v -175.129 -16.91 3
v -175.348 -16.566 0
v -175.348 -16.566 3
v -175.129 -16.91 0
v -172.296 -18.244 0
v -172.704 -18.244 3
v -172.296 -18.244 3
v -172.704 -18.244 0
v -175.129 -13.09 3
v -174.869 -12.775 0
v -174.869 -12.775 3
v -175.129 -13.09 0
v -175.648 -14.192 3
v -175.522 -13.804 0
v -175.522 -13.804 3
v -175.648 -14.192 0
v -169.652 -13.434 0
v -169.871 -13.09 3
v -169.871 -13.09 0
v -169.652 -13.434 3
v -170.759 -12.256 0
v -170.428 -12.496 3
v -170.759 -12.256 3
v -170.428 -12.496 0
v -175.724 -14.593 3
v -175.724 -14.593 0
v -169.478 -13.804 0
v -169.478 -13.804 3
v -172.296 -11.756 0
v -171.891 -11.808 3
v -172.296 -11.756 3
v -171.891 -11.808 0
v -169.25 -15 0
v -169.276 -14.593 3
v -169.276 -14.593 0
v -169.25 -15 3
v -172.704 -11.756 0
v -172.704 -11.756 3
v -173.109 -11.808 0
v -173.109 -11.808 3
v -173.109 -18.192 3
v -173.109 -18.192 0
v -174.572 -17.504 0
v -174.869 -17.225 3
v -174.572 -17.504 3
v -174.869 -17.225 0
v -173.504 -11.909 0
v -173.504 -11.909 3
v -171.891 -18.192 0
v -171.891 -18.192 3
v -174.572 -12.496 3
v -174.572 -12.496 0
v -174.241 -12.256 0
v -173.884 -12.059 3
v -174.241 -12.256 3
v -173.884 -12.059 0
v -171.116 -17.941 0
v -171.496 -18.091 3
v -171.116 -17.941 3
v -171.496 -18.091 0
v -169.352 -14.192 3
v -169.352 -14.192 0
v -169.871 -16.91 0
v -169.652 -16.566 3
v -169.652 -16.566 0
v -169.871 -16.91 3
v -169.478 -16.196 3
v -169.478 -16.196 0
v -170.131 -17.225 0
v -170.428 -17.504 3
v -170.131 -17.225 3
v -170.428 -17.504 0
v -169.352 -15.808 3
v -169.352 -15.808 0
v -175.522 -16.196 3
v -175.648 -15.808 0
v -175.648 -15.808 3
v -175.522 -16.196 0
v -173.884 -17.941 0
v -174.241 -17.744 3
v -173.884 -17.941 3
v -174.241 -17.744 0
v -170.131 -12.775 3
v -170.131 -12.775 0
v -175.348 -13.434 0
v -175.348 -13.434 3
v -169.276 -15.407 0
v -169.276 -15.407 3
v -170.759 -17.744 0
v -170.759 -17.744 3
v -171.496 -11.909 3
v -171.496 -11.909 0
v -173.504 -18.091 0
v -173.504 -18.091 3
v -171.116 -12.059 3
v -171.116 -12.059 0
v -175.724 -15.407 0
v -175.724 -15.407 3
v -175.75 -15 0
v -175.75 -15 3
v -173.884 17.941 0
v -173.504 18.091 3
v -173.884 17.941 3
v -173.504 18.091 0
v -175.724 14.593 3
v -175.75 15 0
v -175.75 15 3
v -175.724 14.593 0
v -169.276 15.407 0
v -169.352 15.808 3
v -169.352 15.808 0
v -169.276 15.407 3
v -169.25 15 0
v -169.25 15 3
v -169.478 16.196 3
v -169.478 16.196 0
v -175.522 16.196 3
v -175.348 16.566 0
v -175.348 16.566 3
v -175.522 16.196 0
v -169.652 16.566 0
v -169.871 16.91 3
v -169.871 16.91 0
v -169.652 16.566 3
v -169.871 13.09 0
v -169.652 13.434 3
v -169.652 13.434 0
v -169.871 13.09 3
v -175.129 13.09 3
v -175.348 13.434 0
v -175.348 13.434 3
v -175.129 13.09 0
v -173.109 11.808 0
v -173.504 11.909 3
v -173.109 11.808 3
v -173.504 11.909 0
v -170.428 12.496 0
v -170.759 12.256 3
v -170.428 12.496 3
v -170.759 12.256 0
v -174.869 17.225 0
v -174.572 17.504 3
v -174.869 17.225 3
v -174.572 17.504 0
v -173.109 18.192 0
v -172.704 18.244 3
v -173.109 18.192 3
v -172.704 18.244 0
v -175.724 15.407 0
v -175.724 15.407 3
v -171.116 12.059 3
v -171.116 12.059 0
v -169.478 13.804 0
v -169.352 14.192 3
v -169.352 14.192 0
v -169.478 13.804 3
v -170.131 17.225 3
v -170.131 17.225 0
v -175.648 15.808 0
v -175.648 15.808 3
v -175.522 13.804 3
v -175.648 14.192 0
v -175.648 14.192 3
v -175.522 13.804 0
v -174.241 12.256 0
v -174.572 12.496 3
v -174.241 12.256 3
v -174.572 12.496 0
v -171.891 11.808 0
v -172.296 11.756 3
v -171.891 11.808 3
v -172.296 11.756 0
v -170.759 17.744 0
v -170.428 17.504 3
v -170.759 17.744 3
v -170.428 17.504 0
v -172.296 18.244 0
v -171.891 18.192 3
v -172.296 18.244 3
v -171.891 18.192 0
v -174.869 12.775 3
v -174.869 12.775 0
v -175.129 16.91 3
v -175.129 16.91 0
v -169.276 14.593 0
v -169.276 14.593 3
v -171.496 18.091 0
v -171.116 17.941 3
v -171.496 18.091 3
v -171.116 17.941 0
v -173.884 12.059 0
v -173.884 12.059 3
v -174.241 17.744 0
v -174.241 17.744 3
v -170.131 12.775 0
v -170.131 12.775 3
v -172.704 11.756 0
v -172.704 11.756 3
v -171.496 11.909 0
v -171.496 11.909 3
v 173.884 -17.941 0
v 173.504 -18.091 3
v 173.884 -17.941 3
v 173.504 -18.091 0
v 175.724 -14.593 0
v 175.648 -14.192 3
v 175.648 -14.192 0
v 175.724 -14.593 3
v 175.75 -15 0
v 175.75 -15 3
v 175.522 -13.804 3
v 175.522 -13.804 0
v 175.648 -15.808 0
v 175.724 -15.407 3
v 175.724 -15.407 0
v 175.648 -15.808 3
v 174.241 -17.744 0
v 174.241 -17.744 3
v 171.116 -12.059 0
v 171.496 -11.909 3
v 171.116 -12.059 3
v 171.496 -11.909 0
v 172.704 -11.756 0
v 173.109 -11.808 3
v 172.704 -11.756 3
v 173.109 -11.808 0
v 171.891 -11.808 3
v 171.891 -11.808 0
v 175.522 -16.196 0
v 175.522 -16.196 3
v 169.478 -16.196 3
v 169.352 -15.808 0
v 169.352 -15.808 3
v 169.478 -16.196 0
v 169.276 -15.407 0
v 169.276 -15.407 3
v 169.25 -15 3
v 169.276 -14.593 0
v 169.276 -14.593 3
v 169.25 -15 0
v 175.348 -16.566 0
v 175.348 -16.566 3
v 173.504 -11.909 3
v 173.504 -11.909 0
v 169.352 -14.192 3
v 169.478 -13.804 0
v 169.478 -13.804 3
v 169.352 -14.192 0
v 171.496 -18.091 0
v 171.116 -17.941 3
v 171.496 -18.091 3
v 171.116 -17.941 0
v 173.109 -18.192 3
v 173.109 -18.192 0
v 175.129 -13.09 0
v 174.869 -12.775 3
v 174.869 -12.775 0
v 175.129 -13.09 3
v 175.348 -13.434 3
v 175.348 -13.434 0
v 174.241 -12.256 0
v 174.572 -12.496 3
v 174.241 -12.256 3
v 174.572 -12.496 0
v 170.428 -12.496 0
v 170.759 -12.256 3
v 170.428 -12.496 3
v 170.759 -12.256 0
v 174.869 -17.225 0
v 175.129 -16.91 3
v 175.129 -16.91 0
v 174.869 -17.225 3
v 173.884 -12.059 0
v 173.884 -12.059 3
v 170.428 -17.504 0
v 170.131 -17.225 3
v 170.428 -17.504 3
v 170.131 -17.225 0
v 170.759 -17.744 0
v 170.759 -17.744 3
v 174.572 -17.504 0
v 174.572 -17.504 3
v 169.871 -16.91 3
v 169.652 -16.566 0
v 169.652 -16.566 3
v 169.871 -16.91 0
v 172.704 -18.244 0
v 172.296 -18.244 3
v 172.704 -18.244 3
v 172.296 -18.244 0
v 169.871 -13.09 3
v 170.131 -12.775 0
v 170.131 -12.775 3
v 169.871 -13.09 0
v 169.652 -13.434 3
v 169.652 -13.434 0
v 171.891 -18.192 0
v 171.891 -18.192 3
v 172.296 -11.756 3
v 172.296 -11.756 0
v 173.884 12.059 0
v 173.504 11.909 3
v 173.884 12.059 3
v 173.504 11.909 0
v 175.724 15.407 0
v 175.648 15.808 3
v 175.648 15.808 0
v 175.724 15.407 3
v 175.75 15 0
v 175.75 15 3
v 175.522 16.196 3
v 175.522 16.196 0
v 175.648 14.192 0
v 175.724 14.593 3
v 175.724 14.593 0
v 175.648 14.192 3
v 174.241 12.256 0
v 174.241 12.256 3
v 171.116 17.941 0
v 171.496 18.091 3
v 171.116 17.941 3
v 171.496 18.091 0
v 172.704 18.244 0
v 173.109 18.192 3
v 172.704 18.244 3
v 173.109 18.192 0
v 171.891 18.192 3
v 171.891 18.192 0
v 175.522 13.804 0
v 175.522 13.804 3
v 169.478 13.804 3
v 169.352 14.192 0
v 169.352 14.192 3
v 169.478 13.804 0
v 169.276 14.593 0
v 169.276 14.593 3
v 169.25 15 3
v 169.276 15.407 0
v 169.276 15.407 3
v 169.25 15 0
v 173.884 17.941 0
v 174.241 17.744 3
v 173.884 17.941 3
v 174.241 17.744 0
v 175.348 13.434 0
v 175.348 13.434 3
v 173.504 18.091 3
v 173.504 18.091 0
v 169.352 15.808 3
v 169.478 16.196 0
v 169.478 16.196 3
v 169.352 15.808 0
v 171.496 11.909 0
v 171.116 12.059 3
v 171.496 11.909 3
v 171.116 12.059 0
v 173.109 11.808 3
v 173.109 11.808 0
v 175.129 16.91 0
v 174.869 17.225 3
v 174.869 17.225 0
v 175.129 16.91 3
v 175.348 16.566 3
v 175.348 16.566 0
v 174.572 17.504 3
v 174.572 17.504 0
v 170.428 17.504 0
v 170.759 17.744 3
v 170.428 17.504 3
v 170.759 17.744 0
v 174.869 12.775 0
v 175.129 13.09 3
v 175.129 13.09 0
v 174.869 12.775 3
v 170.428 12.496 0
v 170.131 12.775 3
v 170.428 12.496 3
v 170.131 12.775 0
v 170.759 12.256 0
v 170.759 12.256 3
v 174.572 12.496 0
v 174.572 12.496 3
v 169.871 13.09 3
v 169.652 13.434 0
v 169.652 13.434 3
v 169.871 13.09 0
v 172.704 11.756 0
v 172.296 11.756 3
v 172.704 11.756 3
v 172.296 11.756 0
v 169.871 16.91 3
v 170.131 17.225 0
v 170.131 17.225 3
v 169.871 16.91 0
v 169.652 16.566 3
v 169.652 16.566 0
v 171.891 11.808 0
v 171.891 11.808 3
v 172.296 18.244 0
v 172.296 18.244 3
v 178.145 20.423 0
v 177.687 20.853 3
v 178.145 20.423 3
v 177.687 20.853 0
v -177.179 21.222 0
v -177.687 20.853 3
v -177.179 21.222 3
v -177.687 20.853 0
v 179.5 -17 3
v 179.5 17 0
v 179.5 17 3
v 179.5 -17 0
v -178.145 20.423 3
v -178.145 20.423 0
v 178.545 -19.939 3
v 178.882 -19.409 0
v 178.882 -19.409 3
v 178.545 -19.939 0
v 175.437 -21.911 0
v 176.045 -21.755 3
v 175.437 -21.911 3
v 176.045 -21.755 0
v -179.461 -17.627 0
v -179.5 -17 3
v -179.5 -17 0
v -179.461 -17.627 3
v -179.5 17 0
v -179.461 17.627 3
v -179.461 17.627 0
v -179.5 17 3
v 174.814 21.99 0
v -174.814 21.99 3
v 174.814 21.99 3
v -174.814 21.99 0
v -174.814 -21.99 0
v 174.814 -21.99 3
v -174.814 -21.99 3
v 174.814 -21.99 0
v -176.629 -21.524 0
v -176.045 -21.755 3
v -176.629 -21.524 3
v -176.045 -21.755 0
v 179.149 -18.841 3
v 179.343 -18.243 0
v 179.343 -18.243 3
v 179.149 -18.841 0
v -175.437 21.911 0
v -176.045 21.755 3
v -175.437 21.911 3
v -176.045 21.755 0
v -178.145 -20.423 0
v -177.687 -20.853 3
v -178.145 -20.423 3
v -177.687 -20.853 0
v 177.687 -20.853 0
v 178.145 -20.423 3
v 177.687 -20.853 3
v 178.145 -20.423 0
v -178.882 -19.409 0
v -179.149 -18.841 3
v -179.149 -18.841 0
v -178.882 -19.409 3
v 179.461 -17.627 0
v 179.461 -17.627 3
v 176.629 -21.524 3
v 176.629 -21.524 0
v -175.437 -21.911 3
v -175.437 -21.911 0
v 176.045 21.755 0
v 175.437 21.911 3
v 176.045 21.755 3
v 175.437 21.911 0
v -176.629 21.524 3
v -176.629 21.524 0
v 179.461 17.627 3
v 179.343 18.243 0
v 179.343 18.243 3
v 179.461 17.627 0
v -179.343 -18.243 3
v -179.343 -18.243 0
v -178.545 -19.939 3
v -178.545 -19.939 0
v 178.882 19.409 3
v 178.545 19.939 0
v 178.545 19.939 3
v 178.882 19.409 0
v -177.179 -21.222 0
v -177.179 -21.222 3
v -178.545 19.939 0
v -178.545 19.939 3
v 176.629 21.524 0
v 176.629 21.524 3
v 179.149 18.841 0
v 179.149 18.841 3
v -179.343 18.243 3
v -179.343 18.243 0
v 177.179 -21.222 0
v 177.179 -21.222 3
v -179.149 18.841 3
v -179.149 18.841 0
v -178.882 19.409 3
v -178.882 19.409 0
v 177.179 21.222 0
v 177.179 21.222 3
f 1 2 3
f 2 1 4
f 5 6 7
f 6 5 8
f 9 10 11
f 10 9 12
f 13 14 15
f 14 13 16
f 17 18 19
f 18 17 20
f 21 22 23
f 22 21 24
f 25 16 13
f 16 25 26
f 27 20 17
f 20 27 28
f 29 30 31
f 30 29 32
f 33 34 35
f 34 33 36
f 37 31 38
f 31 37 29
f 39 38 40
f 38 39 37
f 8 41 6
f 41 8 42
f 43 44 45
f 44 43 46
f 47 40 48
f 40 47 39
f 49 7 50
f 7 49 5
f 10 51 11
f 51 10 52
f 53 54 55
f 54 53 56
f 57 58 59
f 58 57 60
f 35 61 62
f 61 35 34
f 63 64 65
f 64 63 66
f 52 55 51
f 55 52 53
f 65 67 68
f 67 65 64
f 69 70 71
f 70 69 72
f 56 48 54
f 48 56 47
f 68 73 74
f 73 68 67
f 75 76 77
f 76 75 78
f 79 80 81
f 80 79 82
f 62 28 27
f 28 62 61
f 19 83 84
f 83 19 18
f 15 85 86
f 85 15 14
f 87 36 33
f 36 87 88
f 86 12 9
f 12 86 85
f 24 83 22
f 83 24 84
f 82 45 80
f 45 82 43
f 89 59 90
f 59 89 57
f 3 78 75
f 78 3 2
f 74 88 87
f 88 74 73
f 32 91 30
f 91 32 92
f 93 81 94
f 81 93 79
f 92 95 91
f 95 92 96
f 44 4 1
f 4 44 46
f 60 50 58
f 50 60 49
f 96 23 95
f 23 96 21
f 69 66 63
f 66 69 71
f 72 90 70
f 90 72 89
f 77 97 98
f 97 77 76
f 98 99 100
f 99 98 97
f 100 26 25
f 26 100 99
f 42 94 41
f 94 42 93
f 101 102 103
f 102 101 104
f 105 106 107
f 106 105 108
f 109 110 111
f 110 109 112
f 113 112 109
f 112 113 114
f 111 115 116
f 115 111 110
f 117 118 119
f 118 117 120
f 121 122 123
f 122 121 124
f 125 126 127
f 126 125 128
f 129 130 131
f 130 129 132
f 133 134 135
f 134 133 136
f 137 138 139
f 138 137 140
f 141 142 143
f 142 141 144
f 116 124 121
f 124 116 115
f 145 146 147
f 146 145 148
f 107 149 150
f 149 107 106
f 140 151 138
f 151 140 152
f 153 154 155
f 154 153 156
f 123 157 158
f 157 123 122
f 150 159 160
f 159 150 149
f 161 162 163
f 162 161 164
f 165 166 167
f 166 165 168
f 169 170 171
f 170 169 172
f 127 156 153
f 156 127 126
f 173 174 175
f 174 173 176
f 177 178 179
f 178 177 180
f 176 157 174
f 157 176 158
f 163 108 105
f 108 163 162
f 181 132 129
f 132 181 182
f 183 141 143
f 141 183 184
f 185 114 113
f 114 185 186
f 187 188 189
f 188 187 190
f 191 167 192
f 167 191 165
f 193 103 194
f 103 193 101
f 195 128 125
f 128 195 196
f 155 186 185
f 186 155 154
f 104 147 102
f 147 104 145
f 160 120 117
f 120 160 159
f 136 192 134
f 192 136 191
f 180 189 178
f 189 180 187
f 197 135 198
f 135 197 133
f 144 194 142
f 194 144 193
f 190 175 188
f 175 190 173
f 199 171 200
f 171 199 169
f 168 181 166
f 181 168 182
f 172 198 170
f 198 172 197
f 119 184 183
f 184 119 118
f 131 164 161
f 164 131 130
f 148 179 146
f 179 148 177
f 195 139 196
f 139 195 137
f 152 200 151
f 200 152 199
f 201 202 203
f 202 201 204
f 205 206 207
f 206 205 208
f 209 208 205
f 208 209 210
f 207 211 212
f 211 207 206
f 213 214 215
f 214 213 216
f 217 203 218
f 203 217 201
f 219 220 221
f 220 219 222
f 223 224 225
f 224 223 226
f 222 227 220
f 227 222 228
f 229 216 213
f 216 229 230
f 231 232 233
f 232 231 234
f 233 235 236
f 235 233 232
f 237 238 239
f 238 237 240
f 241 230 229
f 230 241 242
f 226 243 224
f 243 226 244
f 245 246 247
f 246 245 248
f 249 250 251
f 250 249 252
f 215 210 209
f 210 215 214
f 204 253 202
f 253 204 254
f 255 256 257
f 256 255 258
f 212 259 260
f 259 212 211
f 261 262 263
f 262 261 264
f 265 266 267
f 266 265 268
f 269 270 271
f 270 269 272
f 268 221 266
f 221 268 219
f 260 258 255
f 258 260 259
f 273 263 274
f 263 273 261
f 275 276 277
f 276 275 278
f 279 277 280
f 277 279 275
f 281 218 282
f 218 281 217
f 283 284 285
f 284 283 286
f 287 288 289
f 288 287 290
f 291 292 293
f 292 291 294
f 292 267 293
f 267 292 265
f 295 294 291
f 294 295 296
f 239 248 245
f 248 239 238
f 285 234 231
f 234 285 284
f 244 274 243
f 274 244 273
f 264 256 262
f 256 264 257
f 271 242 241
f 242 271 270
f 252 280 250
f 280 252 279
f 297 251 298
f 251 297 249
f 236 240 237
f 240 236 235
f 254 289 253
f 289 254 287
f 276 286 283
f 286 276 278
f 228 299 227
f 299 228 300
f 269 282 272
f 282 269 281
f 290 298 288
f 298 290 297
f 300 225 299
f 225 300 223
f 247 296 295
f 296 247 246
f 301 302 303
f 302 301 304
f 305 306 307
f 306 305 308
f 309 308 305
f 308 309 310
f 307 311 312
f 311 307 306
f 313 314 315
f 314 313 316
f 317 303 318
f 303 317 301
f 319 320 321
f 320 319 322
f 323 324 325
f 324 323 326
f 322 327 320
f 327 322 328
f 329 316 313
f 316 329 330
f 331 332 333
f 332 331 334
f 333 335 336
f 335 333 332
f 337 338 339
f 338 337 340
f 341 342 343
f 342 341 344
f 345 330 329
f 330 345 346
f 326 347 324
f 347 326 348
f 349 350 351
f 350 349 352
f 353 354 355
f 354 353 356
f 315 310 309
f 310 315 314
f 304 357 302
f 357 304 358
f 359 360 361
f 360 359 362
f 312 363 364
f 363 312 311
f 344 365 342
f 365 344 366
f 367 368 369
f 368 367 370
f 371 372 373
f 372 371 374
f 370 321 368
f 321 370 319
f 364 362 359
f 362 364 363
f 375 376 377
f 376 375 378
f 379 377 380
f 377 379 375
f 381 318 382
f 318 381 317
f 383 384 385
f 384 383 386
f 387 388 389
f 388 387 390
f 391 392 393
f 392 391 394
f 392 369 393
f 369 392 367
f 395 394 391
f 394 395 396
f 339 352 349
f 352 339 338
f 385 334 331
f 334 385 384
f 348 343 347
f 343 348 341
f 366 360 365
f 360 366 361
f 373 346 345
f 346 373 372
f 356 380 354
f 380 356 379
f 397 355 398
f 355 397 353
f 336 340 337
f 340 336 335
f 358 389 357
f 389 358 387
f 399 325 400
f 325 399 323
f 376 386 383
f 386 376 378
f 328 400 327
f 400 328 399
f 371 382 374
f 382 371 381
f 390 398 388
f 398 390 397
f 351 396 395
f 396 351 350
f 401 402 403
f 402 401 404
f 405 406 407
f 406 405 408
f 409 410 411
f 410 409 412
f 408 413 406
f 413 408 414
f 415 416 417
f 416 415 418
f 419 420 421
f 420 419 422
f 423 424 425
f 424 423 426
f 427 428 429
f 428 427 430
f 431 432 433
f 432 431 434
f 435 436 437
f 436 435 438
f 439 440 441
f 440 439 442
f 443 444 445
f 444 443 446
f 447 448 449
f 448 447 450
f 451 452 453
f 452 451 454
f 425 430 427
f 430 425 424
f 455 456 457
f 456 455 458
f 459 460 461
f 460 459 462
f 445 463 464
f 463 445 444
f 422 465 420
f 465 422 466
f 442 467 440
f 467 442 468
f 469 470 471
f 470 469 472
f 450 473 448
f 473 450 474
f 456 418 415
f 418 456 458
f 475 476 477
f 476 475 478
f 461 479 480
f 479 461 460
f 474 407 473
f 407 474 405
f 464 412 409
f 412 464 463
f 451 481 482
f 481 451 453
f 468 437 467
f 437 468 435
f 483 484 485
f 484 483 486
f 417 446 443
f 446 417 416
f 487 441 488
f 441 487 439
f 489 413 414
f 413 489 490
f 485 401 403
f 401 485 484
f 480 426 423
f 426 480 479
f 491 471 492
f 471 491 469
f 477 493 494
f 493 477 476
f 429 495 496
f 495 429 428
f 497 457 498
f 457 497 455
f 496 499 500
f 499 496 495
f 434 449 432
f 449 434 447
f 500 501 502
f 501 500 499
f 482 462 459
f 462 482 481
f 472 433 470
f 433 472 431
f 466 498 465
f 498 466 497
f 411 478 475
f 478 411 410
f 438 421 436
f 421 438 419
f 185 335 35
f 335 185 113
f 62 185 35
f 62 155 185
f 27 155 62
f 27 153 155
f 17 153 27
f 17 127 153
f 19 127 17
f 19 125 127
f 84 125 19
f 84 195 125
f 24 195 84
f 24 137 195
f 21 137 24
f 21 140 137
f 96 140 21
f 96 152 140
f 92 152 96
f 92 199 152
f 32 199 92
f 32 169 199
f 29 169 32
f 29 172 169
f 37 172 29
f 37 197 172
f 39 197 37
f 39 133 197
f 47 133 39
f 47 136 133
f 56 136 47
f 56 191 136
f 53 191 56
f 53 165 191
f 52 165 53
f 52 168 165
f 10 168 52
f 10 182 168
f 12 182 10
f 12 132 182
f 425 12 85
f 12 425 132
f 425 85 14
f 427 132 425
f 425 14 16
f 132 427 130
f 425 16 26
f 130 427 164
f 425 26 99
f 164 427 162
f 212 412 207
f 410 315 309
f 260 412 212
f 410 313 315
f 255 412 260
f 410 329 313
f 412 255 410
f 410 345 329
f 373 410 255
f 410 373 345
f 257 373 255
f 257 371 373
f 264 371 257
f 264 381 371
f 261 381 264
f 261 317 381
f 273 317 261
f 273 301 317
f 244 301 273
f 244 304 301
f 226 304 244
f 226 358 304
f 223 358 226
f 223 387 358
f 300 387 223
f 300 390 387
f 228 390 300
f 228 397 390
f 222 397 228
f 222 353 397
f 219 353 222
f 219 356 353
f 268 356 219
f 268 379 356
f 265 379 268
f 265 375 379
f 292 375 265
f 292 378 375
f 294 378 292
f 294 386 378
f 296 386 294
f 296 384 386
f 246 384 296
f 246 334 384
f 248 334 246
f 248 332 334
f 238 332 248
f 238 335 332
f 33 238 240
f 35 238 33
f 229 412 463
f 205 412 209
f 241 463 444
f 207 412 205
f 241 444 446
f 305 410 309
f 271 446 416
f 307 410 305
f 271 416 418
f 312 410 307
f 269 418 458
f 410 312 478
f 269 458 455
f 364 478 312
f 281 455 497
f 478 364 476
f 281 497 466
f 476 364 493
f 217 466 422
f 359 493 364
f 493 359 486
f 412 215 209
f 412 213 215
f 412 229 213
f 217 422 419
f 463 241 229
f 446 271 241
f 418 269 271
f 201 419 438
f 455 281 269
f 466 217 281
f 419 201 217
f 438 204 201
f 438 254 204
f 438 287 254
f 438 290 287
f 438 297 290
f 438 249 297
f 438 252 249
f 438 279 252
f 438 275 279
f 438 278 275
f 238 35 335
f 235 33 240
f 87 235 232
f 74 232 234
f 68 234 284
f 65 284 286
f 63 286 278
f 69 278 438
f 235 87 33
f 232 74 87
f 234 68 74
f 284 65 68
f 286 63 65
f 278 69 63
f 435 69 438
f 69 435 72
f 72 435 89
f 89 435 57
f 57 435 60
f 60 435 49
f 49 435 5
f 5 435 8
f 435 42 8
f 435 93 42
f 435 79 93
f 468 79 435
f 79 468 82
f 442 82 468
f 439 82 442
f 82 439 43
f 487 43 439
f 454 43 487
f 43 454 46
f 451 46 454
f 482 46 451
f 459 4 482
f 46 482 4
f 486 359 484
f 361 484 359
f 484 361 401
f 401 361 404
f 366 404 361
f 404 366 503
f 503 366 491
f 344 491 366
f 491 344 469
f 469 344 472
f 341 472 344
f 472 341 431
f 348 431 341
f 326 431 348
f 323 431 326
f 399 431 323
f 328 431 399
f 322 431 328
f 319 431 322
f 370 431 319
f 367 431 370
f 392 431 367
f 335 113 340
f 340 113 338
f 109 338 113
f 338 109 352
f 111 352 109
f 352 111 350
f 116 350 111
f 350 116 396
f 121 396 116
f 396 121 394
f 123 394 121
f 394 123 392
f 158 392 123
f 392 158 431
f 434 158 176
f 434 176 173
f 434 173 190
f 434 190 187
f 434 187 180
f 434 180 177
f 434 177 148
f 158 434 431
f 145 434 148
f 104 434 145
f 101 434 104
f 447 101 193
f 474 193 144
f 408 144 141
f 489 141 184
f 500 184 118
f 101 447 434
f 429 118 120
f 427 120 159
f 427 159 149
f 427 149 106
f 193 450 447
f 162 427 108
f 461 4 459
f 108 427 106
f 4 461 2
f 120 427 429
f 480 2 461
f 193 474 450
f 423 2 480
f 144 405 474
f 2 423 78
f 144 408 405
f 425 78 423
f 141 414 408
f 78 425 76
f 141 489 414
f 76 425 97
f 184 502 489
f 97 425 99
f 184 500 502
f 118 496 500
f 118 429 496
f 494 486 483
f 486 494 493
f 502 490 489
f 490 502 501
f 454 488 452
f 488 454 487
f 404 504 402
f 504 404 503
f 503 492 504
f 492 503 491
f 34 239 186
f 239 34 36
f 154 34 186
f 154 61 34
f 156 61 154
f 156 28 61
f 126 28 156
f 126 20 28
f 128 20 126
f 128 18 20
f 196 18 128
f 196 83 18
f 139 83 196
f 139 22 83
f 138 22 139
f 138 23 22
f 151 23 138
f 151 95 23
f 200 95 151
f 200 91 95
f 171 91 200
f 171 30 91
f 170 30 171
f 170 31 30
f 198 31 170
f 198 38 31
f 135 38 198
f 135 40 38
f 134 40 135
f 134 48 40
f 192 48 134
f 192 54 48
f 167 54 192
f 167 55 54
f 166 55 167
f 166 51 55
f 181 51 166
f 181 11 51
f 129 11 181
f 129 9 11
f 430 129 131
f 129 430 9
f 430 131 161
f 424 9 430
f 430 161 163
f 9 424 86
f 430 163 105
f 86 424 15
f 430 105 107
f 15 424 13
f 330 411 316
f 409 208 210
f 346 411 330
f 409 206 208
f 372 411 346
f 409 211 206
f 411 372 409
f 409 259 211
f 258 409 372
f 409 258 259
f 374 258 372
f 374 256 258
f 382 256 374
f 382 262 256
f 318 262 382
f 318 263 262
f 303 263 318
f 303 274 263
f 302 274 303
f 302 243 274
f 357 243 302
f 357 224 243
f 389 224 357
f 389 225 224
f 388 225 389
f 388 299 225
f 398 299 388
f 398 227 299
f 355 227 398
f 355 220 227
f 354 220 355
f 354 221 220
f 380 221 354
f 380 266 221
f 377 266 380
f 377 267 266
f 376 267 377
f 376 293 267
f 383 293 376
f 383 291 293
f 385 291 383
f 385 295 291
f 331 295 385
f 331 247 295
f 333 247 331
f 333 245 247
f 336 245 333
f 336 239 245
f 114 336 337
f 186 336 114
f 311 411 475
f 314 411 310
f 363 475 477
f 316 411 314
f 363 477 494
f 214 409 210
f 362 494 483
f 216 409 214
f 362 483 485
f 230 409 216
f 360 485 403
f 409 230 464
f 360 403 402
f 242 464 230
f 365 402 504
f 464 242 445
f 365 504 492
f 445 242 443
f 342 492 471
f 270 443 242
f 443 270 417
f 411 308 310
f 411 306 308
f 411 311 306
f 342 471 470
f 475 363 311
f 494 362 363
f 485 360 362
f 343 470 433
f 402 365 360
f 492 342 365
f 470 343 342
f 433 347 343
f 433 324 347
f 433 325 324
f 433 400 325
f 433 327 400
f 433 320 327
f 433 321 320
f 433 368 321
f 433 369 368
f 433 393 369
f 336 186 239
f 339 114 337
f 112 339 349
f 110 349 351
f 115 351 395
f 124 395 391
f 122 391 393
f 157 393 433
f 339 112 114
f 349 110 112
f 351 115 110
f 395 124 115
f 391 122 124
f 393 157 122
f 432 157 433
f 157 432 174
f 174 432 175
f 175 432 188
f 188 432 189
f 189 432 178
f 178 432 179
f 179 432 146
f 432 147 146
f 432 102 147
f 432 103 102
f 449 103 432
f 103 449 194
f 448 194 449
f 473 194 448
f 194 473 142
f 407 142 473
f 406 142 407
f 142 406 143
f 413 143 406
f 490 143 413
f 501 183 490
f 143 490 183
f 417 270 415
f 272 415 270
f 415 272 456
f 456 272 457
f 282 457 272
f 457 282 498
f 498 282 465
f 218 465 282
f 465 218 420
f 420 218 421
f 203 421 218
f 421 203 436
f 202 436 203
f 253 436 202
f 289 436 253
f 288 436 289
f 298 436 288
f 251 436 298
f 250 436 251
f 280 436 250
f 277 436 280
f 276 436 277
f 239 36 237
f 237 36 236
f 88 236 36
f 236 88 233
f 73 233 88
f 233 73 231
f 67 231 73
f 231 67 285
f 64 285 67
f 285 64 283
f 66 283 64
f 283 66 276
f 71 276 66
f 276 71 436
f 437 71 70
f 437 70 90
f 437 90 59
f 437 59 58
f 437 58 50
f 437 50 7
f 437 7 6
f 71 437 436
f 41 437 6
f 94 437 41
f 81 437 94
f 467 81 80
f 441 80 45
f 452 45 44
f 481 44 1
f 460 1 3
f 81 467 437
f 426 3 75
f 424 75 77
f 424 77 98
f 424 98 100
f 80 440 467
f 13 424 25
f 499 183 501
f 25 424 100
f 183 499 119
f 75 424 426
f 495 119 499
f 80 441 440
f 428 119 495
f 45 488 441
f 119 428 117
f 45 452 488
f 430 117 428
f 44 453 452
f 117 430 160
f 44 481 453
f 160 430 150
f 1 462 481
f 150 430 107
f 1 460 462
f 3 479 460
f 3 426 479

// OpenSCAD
$fn = 50;


difference() {
	union() {
		hull() {
			translate(v = [-174.5000000000, 17.0000000000, 0]) {
				cylinder(h = 3, r = 5);
			}
			translate(v = [174.5000000000, 17.0000000000, 0]) {
				cylinder(h = 3, r = 5);
			}
			translate(v = [-174.5000000000, -17.0000000000, 0]) {
				cylinder(h = 3, r = 5);
			}
			translate(v = [174.5000000000, -17.0000000000, 0]) {
				cylinder(h = 3, r = 5);
			}
		}
	}
	union() {
		translate(v = [-172.5000000000, -15.0000000000, -100.0000000000]) {
			cylinder(h = 200, r = 3.2500000000);
		}
		translate(v = [-172.5000000000, 15.0000000000, -100.0000000000]) {
			cylinder(h = 200, r = 3.2500000000);
		}
		translate(v = [172.5000000000, -15.0000000000, -100.0000000000]) {
			cylinder(h = 200, r = 3.2500000000);
		}
		translate(v = [172.5000000000, 15.0000000000, -100.0000000000]) {
			cylinder(h = 200, r = 3.2500000000);
		}
	}
}
